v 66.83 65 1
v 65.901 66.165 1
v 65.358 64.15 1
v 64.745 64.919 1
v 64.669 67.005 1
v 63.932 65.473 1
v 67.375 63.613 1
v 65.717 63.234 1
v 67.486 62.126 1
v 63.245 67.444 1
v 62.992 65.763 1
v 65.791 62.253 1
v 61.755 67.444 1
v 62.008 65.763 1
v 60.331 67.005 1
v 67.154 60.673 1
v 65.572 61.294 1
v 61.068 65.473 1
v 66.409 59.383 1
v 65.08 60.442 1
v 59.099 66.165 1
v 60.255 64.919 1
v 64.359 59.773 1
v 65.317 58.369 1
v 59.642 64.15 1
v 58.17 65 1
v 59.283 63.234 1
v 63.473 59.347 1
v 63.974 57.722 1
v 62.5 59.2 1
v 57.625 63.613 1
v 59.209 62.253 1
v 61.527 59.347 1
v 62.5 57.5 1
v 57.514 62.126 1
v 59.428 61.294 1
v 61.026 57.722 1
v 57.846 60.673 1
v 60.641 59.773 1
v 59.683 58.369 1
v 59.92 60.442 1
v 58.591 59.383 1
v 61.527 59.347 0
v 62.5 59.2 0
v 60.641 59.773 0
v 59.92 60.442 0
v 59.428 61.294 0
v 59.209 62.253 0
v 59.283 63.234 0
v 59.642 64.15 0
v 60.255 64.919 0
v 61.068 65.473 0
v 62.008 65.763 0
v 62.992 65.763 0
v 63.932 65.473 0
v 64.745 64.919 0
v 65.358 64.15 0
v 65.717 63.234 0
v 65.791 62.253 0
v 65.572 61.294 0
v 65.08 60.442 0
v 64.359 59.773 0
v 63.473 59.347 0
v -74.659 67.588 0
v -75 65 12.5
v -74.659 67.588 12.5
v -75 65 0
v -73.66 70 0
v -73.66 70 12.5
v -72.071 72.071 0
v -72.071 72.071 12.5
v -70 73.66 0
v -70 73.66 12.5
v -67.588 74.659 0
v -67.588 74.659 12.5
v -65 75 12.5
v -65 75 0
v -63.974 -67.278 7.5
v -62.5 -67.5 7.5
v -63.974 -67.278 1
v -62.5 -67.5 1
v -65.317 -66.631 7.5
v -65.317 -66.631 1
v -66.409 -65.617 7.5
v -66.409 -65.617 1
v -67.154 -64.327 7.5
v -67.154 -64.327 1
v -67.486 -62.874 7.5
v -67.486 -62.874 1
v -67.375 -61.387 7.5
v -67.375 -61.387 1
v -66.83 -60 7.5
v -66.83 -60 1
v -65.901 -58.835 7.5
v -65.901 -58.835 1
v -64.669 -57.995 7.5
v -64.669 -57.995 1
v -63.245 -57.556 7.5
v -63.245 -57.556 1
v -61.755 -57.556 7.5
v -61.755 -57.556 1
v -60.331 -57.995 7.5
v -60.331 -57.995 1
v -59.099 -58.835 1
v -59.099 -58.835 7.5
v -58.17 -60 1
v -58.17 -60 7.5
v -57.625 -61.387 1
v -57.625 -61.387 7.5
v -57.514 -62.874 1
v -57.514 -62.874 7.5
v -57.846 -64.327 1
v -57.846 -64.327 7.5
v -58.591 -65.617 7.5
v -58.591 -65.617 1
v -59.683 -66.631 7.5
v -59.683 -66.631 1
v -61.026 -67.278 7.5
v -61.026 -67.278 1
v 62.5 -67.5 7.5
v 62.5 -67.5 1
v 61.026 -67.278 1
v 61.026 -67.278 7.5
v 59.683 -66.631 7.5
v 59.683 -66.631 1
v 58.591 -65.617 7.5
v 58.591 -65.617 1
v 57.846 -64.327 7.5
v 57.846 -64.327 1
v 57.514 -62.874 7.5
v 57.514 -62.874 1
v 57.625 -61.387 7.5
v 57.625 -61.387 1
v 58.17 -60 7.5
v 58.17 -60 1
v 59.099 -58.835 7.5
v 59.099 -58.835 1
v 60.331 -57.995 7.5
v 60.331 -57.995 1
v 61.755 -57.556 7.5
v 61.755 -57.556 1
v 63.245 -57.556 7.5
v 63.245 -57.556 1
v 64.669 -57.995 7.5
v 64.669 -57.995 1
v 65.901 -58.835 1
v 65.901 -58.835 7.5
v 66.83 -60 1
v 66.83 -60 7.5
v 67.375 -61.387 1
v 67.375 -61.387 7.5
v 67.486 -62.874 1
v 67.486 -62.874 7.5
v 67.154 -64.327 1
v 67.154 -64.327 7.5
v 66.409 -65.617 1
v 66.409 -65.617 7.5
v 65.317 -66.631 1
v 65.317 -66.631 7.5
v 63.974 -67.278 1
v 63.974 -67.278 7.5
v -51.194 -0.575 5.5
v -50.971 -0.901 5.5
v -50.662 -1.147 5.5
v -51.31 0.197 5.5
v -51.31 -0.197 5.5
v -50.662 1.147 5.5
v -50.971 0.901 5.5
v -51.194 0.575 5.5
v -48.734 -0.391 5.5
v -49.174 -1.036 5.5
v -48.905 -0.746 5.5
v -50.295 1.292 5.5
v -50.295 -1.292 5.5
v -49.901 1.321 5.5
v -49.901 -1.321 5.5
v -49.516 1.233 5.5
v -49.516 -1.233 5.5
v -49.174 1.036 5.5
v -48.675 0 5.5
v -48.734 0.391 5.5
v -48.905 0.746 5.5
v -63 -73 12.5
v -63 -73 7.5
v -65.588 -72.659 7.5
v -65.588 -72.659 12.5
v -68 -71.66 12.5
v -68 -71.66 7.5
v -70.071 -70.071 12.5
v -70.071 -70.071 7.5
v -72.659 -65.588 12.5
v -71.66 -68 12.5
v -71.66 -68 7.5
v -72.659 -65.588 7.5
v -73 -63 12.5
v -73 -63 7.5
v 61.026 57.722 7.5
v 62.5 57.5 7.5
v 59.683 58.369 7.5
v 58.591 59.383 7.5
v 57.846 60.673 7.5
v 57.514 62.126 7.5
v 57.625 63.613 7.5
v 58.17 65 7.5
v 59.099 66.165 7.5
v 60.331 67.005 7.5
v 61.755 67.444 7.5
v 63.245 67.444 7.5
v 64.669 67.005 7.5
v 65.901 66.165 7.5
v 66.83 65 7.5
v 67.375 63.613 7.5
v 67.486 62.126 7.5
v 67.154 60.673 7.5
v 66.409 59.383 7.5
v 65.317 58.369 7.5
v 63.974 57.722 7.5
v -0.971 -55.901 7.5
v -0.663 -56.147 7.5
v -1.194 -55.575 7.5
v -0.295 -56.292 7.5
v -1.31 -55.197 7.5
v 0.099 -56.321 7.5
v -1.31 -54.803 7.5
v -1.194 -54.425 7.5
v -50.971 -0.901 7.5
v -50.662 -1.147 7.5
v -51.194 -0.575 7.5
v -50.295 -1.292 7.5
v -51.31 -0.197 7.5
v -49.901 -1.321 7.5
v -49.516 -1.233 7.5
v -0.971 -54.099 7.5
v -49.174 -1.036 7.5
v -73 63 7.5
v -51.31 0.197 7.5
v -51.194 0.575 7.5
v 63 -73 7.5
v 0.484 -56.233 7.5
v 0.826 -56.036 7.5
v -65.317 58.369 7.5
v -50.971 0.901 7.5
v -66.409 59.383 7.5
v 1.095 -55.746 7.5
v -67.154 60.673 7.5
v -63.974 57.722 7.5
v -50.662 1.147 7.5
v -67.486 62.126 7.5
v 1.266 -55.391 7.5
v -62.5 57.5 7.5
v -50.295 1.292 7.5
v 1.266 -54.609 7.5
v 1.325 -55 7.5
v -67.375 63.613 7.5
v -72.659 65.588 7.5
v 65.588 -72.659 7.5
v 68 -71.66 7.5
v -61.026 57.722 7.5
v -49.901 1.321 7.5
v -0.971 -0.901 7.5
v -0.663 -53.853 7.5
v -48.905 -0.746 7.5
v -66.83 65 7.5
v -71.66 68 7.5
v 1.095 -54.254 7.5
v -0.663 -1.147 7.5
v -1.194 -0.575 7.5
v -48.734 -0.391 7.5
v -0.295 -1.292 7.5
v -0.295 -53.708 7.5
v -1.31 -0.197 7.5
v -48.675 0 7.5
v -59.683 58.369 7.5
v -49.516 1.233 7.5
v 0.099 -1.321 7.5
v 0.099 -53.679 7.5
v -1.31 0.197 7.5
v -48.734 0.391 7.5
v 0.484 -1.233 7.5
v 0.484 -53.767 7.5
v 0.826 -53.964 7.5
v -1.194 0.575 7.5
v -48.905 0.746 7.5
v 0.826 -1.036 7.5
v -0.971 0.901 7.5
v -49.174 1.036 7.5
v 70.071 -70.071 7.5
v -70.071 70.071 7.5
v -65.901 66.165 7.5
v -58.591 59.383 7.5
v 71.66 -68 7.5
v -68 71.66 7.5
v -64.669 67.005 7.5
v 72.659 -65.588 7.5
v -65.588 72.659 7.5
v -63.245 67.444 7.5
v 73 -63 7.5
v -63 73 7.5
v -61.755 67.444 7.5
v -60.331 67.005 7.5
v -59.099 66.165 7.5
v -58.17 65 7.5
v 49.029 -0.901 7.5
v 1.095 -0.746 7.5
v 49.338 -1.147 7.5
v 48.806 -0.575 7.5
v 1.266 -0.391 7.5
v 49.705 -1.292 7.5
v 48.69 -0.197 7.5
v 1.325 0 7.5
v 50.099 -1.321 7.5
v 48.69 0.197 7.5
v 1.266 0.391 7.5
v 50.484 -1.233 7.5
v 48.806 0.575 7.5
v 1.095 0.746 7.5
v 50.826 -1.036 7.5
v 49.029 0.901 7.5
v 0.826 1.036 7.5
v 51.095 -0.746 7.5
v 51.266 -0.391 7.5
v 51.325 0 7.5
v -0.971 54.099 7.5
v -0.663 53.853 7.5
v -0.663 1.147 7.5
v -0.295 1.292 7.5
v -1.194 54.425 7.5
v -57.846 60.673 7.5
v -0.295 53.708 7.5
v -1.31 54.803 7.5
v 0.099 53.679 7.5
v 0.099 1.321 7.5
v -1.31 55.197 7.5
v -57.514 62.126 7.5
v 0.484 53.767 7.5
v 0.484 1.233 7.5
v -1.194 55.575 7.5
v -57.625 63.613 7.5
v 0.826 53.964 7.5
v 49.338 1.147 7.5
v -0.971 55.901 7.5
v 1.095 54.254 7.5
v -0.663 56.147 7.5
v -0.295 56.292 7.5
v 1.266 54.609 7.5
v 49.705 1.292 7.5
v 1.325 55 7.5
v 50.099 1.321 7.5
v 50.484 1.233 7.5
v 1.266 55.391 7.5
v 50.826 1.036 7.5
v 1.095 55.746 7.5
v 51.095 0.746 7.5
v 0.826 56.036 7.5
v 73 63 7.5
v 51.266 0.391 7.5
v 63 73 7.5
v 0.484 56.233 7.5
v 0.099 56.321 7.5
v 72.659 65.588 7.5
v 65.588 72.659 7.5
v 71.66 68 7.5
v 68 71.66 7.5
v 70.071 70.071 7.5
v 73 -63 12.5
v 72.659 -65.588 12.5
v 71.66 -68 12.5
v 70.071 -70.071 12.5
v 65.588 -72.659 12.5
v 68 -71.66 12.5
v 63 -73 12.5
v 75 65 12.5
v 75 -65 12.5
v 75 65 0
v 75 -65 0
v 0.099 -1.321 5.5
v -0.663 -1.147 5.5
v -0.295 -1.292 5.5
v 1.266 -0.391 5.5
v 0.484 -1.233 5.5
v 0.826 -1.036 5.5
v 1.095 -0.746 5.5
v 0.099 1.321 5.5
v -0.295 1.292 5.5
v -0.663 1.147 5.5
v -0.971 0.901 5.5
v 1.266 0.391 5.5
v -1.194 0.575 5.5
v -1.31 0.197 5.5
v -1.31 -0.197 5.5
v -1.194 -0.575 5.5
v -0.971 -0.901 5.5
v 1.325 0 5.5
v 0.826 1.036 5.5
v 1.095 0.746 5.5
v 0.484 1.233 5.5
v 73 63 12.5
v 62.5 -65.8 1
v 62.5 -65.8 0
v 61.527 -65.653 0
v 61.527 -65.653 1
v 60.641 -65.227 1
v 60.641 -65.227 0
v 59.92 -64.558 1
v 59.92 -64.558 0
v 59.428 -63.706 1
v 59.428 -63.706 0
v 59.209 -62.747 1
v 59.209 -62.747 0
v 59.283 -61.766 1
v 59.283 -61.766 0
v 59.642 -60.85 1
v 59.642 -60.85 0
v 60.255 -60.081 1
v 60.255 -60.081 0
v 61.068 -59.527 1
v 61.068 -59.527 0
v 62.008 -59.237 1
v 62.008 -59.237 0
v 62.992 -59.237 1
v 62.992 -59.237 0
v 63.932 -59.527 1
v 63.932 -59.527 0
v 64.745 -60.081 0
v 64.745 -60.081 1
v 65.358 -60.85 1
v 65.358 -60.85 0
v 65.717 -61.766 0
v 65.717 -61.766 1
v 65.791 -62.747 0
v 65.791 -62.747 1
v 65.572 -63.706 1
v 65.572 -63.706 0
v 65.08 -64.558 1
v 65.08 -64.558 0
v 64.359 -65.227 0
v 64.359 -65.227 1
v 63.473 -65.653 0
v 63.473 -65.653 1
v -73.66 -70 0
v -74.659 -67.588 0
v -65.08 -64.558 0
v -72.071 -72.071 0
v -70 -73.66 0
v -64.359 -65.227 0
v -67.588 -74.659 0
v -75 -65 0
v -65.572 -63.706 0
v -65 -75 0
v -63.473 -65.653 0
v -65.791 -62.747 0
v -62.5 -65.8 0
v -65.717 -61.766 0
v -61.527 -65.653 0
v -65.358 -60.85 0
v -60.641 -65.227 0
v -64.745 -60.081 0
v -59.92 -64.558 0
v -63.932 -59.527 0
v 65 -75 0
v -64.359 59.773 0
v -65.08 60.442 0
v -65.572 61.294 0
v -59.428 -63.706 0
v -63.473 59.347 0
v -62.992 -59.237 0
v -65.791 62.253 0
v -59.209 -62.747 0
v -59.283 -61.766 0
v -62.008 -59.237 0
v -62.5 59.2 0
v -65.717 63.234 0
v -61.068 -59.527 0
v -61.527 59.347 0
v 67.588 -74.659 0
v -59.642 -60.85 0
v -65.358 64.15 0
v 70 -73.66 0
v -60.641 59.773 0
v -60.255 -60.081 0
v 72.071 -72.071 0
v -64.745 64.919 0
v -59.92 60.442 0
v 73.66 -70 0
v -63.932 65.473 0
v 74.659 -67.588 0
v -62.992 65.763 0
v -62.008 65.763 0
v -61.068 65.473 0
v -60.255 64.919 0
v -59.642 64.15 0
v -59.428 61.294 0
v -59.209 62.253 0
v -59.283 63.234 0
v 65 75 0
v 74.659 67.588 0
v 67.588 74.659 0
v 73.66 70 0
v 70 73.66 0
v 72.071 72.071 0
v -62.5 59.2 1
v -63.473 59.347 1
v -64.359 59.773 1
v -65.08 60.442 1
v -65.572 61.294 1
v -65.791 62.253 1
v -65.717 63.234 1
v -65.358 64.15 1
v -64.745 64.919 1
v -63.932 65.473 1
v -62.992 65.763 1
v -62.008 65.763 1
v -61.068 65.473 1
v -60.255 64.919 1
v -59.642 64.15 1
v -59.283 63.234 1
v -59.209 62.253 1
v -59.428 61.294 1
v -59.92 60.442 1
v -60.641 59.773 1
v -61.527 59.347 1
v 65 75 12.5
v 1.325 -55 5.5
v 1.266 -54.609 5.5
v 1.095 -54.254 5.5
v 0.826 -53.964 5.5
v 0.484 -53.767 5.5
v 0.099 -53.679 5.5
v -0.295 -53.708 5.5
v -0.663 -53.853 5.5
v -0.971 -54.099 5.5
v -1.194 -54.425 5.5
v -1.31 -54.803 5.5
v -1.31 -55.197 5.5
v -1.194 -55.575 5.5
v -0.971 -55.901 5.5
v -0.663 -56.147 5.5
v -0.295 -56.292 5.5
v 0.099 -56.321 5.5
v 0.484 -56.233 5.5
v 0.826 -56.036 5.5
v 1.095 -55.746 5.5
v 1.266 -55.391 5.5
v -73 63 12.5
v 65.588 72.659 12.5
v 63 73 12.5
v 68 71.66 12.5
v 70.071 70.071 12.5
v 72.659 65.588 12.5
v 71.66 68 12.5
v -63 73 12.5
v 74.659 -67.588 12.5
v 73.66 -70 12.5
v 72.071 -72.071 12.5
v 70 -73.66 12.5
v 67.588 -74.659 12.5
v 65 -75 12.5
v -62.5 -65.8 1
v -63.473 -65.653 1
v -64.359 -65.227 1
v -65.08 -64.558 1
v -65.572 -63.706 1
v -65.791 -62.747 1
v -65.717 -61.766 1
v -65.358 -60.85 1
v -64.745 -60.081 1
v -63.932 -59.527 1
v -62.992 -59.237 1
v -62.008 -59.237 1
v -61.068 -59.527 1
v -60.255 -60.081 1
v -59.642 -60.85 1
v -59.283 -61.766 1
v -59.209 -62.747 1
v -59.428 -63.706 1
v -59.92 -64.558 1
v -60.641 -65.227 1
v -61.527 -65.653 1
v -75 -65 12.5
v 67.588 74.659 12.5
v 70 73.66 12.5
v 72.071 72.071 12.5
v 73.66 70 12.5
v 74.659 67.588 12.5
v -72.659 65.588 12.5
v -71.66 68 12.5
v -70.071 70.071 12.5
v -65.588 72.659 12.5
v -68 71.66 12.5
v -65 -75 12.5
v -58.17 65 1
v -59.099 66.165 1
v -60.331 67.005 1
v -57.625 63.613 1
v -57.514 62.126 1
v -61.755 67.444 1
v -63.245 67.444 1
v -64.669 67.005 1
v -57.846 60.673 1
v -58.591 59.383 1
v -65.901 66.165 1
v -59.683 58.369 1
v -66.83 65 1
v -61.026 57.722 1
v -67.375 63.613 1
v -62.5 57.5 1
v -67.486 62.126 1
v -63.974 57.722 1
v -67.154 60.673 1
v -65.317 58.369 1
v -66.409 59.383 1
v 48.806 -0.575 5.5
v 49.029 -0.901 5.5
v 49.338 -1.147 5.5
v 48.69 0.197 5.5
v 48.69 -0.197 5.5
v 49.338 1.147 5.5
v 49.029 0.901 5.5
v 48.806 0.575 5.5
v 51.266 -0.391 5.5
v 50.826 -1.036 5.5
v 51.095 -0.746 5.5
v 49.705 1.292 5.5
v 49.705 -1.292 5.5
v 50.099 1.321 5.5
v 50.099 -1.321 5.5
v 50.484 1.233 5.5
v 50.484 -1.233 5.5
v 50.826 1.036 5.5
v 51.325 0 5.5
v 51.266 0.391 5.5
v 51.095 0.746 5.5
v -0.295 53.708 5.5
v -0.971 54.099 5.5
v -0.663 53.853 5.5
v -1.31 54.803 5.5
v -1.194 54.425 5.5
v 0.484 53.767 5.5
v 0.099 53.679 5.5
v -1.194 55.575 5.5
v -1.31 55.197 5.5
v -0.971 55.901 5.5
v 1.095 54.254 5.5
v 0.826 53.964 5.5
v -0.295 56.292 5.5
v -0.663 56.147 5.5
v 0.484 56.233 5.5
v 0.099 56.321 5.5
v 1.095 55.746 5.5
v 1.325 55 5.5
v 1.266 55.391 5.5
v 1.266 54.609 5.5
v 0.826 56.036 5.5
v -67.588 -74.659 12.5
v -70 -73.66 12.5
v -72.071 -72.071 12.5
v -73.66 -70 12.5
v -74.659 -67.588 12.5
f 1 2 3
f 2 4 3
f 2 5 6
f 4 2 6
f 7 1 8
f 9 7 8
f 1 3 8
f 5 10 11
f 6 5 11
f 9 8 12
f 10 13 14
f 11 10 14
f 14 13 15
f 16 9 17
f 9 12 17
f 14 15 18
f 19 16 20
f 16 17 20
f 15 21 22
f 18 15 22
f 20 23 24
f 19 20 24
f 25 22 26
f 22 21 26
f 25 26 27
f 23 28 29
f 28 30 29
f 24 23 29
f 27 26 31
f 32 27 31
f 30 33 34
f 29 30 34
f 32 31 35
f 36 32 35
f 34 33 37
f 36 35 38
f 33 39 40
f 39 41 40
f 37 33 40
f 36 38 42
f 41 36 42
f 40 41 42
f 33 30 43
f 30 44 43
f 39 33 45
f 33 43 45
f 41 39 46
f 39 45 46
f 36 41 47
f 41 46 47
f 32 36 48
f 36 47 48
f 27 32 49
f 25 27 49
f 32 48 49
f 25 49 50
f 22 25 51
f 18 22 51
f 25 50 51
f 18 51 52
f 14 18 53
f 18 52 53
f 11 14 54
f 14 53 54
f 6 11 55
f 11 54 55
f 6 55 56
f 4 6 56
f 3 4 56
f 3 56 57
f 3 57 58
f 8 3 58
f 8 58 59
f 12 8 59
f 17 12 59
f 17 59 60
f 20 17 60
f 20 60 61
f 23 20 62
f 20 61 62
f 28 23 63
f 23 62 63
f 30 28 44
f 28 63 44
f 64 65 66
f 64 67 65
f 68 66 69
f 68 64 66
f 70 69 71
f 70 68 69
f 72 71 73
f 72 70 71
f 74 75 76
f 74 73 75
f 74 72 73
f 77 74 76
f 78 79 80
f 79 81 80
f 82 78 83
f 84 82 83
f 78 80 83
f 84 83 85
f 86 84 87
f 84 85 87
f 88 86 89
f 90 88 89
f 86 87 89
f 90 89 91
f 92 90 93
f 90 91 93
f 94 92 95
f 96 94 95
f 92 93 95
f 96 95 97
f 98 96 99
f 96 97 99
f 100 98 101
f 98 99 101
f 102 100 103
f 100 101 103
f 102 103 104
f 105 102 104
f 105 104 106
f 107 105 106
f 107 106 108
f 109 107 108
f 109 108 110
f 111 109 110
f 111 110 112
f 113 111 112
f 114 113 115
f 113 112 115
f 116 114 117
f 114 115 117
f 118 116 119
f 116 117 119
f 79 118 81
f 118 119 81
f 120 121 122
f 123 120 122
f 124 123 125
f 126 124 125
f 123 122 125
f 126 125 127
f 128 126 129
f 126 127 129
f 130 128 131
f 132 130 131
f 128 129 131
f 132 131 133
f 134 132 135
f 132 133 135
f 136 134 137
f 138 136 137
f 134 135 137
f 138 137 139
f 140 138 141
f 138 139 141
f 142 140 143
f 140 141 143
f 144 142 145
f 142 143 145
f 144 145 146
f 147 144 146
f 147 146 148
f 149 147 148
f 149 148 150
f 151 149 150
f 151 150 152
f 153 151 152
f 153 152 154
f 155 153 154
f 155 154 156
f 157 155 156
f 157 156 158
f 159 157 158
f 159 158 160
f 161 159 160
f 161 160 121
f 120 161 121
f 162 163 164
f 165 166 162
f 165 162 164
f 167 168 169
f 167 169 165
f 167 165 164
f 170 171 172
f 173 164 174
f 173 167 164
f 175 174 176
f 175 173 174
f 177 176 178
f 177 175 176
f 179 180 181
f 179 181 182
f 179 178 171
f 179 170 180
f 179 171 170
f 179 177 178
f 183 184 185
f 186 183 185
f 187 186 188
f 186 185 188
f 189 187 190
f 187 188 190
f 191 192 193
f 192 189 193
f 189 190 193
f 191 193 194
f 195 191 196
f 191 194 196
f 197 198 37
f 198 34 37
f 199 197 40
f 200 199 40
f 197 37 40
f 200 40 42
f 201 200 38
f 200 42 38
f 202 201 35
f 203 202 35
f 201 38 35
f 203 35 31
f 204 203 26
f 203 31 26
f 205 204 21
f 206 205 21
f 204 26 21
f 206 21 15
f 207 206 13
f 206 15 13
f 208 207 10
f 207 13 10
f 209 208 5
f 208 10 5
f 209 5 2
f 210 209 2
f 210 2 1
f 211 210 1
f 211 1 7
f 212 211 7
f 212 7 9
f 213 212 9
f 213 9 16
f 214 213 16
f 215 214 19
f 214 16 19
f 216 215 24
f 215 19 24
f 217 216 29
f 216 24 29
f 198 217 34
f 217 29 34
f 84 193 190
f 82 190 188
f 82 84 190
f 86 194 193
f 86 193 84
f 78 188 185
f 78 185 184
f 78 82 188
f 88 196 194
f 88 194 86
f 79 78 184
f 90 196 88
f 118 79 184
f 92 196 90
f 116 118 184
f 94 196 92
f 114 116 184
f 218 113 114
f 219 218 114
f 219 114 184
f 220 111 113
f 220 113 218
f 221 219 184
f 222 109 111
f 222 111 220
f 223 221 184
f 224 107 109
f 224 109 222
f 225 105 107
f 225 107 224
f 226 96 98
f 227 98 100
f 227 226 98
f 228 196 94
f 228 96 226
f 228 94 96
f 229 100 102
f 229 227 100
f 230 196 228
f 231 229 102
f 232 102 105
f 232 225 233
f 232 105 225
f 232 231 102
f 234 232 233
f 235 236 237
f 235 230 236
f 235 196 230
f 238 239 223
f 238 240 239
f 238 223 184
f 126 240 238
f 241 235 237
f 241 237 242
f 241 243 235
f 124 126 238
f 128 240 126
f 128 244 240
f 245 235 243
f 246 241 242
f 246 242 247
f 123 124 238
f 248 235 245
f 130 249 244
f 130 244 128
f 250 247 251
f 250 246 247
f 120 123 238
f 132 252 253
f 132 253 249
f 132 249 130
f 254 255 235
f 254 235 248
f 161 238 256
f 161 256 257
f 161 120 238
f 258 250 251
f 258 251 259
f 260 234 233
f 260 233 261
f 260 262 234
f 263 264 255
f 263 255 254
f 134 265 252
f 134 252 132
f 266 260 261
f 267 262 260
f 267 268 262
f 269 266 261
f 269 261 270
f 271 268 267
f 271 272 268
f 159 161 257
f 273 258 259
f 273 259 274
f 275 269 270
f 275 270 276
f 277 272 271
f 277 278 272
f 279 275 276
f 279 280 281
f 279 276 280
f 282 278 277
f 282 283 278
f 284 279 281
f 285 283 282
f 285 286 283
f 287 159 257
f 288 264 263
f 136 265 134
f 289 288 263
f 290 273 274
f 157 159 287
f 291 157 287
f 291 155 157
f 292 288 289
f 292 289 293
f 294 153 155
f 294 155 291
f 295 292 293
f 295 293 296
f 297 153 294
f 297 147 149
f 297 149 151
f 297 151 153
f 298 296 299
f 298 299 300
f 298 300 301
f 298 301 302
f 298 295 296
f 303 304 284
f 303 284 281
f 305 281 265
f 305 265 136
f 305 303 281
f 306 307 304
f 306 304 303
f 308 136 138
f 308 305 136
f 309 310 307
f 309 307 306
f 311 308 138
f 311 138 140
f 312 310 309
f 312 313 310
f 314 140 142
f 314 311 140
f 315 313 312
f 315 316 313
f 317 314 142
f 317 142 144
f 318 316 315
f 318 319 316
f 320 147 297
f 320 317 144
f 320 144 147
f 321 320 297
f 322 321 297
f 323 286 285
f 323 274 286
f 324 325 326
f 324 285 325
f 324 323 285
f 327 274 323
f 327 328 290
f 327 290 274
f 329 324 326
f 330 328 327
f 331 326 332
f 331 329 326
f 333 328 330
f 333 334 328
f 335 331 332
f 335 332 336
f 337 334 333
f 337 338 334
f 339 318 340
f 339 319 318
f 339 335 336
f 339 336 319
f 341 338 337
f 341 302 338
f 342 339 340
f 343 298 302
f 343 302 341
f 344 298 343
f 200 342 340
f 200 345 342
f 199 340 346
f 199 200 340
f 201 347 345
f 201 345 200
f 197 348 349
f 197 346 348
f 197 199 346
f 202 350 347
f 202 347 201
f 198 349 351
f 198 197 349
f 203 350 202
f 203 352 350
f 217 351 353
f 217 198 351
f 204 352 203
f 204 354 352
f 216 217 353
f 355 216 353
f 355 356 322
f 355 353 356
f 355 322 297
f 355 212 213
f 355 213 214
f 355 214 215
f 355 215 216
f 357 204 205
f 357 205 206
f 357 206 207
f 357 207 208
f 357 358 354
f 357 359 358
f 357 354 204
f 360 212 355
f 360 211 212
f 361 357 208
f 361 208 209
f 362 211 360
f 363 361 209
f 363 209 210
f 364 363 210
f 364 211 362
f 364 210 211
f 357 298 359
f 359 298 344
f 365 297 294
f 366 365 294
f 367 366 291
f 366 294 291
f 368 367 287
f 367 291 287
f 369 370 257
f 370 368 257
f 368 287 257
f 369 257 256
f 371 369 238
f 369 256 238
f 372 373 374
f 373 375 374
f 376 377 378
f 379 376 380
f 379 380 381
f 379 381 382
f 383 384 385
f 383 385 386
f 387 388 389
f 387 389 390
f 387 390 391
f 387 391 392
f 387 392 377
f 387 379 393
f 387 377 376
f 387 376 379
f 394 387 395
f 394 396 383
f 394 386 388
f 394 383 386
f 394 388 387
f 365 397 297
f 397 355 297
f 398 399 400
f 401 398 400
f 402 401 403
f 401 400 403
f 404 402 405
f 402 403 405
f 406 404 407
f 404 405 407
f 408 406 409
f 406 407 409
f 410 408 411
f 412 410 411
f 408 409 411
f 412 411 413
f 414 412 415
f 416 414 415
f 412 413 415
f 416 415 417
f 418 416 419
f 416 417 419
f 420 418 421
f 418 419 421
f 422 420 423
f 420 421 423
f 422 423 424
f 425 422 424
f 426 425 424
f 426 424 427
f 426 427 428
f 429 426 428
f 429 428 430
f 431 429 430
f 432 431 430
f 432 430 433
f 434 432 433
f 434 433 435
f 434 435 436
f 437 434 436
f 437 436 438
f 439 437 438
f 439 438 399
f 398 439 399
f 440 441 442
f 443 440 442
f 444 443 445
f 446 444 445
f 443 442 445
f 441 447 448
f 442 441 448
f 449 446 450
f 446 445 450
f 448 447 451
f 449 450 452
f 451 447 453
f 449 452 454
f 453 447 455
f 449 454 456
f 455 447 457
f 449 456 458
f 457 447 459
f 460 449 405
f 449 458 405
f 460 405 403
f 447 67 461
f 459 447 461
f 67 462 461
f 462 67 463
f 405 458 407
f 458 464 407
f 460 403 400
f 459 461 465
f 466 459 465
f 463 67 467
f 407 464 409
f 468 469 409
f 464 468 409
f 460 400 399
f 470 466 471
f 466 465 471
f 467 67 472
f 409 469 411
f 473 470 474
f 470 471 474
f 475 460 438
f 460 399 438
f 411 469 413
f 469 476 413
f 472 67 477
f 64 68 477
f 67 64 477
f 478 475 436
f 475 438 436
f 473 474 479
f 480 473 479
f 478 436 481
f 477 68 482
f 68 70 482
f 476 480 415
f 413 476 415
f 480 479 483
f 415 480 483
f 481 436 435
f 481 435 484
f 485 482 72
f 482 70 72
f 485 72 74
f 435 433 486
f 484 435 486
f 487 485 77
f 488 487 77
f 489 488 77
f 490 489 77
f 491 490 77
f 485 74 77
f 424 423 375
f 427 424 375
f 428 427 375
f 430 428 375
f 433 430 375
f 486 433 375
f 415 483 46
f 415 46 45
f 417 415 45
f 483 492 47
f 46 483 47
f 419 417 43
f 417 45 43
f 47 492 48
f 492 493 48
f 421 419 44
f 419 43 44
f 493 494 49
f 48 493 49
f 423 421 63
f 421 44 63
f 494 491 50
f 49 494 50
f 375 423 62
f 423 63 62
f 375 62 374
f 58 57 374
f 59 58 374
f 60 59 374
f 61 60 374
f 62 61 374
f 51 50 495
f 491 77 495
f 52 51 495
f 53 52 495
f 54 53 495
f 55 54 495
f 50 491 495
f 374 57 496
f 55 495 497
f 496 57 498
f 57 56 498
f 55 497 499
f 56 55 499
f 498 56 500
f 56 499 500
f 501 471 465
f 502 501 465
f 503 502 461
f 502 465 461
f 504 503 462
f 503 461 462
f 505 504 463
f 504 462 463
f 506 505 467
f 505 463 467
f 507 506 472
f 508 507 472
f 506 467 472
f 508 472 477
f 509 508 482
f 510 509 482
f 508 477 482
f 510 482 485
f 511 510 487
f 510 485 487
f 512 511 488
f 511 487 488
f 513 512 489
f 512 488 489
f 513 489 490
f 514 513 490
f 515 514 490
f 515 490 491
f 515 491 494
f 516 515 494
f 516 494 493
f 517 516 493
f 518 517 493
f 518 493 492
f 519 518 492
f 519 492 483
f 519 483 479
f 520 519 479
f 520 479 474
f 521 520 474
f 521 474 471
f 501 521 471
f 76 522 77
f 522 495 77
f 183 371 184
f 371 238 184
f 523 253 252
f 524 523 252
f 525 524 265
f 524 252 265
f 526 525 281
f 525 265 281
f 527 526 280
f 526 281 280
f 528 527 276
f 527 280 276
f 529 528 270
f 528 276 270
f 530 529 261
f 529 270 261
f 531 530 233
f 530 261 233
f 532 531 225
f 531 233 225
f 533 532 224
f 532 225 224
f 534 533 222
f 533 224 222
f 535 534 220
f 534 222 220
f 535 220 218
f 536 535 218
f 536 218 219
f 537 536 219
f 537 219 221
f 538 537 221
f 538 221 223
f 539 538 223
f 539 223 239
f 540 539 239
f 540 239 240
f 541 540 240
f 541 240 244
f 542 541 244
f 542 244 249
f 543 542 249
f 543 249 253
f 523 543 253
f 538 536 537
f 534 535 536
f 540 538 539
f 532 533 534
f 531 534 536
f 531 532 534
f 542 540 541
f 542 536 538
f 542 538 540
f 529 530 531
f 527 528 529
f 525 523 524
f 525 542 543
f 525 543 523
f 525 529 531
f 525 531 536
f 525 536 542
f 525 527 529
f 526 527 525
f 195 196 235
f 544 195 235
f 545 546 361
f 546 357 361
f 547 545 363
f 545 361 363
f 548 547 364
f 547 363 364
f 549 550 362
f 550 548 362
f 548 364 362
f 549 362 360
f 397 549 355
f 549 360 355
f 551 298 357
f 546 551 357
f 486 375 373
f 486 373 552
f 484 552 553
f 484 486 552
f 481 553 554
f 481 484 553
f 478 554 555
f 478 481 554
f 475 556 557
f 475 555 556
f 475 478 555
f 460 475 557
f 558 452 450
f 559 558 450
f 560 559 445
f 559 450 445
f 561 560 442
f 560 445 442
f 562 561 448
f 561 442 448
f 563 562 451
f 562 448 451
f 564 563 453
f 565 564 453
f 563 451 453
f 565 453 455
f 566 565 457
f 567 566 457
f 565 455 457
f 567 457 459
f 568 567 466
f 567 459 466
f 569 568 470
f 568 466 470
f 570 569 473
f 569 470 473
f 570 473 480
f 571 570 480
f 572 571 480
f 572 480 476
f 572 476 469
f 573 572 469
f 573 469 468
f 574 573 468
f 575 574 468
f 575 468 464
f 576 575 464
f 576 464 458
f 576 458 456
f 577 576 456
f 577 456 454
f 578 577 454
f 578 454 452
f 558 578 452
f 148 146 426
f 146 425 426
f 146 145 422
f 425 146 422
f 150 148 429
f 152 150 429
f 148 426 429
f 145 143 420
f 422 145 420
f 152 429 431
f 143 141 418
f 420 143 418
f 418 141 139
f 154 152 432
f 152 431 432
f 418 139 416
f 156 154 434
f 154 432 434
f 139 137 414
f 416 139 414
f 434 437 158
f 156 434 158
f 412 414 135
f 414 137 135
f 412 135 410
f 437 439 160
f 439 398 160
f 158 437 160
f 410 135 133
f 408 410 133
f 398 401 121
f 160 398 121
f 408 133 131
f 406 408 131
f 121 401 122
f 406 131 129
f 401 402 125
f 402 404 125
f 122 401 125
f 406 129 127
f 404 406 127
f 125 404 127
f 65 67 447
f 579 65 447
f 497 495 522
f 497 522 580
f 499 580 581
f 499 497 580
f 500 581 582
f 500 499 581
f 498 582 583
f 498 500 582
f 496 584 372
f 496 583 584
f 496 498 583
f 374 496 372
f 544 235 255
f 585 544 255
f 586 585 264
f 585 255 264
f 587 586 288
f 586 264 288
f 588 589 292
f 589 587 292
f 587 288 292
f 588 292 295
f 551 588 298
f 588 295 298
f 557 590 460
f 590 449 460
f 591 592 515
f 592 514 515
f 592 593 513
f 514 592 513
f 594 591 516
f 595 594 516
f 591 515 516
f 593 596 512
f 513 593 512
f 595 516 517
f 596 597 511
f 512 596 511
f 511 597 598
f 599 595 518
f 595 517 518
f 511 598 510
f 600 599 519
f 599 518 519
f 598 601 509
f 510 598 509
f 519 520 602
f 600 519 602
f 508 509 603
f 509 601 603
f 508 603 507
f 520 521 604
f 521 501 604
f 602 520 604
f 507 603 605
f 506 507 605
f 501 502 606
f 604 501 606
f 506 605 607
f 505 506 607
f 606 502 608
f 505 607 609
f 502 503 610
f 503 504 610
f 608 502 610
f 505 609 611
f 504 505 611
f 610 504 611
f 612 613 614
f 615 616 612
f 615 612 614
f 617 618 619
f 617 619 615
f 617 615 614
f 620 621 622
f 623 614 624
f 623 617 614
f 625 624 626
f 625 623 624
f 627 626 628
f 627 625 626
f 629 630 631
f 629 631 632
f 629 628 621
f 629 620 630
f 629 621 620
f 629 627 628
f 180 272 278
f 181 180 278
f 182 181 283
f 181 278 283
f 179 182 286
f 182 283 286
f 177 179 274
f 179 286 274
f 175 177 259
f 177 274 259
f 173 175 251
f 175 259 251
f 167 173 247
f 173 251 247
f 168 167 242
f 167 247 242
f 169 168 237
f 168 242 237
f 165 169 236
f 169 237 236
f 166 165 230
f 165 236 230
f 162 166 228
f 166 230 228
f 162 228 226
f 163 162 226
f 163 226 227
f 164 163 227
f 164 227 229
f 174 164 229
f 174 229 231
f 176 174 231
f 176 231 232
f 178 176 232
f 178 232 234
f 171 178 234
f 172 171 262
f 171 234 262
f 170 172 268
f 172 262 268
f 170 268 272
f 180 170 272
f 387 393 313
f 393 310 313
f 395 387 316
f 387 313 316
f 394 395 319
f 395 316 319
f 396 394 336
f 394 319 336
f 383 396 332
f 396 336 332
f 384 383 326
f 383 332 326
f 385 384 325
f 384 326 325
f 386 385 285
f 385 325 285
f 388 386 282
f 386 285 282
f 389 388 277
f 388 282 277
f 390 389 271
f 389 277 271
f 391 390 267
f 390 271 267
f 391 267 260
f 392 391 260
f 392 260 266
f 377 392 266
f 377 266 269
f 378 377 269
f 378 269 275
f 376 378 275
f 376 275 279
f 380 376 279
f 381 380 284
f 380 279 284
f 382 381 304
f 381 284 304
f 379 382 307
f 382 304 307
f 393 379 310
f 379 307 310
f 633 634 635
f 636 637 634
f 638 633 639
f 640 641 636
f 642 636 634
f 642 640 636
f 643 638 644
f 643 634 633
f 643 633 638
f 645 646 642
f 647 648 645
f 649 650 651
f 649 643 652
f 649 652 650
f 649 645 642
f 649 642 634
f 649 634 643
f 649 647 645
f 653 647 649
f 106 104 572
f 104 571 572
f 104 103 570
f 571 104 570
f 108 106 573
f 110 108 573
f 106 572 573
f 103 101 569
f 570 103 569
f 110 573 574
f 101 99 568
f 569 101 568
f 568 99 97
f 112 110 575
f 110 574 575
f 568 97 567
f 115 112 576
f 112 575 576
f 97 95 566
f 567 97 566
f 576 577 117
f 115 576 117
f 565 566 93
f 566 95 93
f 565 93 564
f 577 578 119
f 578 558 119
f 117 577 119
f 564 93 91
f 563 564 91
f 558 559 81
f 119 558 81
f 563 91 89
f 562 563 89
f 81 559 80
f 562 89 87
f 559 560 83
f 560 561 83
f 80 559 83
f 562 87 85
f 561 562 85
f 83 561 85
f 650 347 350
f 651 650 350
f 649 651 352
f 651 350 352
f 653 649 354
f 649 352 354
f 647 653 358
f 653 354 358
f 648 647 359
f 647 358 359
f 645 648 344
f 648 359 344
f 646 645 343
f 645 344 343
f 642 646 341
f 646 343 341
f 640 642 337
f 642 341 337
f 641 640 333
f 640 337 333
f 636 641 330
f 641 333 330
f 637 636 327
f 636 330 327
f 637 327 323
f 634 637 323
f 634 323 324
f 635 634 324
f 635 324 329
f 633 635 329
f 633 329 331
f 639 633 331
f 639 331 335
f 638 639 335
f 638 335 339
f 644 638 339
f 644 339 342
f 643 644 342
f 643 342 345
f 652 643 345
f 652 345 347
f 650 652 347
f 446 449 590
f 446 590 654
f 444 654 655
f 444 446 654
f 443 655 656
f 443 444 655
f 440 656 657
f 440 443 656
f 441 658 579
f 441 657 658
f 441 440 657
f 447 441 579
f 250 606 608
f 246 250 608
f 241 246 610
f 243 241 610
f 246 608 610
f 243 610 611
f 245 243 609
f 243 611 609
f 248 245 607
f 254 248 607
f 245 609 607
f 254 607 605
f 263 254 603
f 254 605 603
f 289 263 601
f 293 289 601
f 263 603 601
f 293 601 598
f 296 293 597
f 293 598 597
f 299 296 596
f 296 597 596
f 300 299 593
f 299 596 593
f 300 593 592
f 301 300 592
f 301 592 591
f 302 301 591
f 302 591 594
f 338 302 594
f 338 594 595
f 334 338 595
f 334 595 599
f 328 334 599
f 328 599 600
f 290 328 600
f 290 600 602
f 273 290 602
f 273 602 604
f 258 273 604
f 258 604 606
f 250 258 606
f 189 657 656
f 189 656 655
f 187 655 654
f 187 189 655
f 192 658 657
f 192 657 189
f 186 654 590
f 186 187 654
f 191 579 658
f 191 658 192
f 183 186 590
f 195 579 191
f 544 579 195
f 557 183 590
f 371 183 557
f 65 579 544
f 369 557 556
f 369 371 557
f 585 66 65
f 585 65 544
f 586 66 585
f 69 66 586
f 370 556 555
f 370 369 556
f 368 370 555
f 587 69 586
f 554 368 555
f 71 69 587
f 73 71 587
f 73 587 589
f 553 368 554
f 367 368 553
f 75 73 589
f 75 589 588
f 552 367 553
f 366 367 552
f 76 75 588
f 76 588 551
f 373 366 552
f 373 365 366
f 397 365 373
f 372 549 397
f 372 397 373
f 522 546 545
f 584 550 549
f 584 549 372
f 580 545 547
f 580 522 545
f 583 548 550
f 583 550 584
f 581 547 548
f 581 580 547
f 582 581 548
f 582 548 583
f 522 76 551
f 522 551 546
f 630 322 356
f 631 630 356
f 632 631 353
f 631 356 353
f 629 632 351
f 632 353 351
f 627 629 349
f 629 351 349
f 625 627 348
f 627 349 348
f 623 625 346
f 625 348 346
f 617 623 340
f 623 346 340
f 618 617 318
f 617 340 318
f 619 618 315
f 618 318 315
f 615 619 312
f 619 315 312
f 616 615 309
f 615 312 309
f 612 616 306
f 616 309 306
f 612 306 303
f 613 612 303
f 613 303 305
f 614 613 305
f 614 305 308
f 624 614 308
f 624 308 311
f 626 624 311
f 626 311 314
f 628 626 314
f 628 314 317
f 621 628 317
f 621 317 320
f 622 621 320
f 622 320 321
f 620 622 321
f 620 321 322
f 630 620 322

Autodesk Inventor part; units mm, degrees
ref_plane "YZ Plane" through (0, 0, 0) normal (1, 0, 0) x (0, 1, 0)
ref_plane "XZ Plane" through (0, 0, 0) normal (0, 1, 0) x (-1, 0, 0)
ref_plane "XY Plane" through (0, 0, 0) normal (0, 0, 1) x (1, 0, 0)
sketch "Sketch5" plane through (0, 0, 0) normal (0, 0, 1) x (1, 0, 0)
  line L0 (-65, 75) -> (65, 75)
  line L1 (75, 65) -> (75, -65)
  line L2 (65, -75) -> (-65, -75)
  line L3 (-75, -65) -> (-75, 65)
  arc A0 (-65, 75) -> (-75, 65) centre (-65, 65) ccw
  arc A1 (-75, -65) -> (-65, -75) centre (-65, -65) ccw
  arc A2 (65, -75) -> (75, -65) centre (65, -65) ccw
  arc A3 (75, 65) -> (65, 75) centre (65, 65) ccw
  point P0 (0, 0)
  point P1 (-75, 75)
  point P2 (75, -75)
  point P3 (75, 75)
  dimension "d36" = 150
  dimension "d37" = 150
  dimension "d38" = 75
  dimension "d39" = 75
  dimension "d40" = 10
extrude "base" add sketch "Sketch5" along normal blind 7.5
sketch "Sketch6" plane through (0, 0, 7.5) normal (0, 0, 1) x (1, 0, 0)
  point P0 (0, 0)
  point P1 (-62.5, 62.5)
  point P2 (62.5, 62.5)
  point P3 (-62.5, -62.5)
  point P4 (62.5, -62.5)
  dimension "d43" = 125
  dimension "d44" = 125
  dimension "d45" = 62.5
  dimension "d46" = 62.5
hole "mountingHoles" at (-62.5, 62.5, 7.5) at (62.5, 62.5, 7.5) at (-62.5, -62.5, 7.5) at (62.5, -62.5, 7.5) direction (0, 0, -1) diameter 6.6 depth 8 tip angle 118 counterbore diameter 10 counterbore depth 6.5 clearance for "Hex Head Cap Screw ISO 24017" size "M6" standard "ISO"
sketch "Sketch7" plane through (0, 0, 7.5) normal (0, 0, 1) x (1, 0, 0)
  line L0 (-63, 73) -> (63, 73)
  line L1 (73, 63) -> (73, -63)
  line L2 (63, -73) -> (-63, -73)
  line L3 (-73, -63) -> (-73, 63)
  line L4 (65, 75) -> (-65, 75) projected
  line L5 (75, -65) -> (75, 65) projected
  line L6 (-65, -75) -> (65, -75) projected
  line L7 (-75, 65) -> (-75, -65) projected
  arc A0 (-63, 73) -> (-73, 63) centre (-63, 63) ccw
  arc A1 (-73, -63) -> (-63, -73) centre (-63, -63) ccw
  arc A2 (63, -73) -> (73, -63) centre (63, -63) ccw
  arc A3 (73, 63) -> (63, 73) centre (63, 63) ccw
  line L8 (-65, 75) -> (65, 75)
  line L9 (75, 65) -> (75, -65)
  line L10 (65, -75) -> (-65, -75)
  line L11 (-75, -65) -> (-75, 65)
  line L12 (-65, -75) -> (65, -75) projected
  arc A4 (-65, 75) -> (-75, 65) centre (-65, 65) ccw
  arc A5 (-75, -65) -> (-65, -75) centre (-65, -65) ccw
  arc A6 (65, -75) -> (75, -65) centre (65, -65) ccw
  arc A7 (75, 65) -> (65, 75) centre (65, 65) ccw
  point P0 (0, 0)
  dimension "d54" = 2
  dimension "d55" = 2
  dimension "d56" = 2
  dimension "d57" = 2
  dimension "d58" = 10
  dimension "d59" = 10
  dimension "d60" = 10
  dimension "d61" = 10
extrude "spillTray" add sketch "Sketch7" along normal blind 5
sketch "Sketch9" plane through (0, 0, 7.5) normal (0, 0, 1) x (1, 0, 0)
  circle A0 centre (0, 55) radius 1.325
  circle A1 centre (-50, 0) radius 1.325
  circle A2 centre (0, -55) radius 1.325
  circle A3 centre (50, 0) radius 1.325
  circle A4 centre (0, 0) radius 1.325
  dimension "d73" = 2.65
  dimension "d74" = 2.65
  dimension "d75" = 2.65
  dimension "d76" = 2.65
  dimension "d77" = 2.65
  dimension "d78" = 55
  dimension "d79" = 55
  dimension "d80" = 50
  dimension "d81" = 50
extrude "Extrusion5" cut sketch "Sketch9" against normal blind 2
equation "\"d38\" = 0.5 * d37"
equation "\"d39\" = 0.5 * d36"
equation "\"d44\" = d43"
equation "\"d45\" = 0.5 * d43"
equation "\"d46\" = 0.5 * d44"
equation "\"d55\" = d54"
equation "\"d56\" = d54"
equation "\"d57\" = d54"
equation "\"d74\" = d73"
equation "\"d75\" = d73"
equation "\"d76\" = d73"
equation "\"d77\" = d73"
equation "\"d79\" = d78"
equation "\"d81\" = d80"
properties part number "sampleHolderXYstageBase"
